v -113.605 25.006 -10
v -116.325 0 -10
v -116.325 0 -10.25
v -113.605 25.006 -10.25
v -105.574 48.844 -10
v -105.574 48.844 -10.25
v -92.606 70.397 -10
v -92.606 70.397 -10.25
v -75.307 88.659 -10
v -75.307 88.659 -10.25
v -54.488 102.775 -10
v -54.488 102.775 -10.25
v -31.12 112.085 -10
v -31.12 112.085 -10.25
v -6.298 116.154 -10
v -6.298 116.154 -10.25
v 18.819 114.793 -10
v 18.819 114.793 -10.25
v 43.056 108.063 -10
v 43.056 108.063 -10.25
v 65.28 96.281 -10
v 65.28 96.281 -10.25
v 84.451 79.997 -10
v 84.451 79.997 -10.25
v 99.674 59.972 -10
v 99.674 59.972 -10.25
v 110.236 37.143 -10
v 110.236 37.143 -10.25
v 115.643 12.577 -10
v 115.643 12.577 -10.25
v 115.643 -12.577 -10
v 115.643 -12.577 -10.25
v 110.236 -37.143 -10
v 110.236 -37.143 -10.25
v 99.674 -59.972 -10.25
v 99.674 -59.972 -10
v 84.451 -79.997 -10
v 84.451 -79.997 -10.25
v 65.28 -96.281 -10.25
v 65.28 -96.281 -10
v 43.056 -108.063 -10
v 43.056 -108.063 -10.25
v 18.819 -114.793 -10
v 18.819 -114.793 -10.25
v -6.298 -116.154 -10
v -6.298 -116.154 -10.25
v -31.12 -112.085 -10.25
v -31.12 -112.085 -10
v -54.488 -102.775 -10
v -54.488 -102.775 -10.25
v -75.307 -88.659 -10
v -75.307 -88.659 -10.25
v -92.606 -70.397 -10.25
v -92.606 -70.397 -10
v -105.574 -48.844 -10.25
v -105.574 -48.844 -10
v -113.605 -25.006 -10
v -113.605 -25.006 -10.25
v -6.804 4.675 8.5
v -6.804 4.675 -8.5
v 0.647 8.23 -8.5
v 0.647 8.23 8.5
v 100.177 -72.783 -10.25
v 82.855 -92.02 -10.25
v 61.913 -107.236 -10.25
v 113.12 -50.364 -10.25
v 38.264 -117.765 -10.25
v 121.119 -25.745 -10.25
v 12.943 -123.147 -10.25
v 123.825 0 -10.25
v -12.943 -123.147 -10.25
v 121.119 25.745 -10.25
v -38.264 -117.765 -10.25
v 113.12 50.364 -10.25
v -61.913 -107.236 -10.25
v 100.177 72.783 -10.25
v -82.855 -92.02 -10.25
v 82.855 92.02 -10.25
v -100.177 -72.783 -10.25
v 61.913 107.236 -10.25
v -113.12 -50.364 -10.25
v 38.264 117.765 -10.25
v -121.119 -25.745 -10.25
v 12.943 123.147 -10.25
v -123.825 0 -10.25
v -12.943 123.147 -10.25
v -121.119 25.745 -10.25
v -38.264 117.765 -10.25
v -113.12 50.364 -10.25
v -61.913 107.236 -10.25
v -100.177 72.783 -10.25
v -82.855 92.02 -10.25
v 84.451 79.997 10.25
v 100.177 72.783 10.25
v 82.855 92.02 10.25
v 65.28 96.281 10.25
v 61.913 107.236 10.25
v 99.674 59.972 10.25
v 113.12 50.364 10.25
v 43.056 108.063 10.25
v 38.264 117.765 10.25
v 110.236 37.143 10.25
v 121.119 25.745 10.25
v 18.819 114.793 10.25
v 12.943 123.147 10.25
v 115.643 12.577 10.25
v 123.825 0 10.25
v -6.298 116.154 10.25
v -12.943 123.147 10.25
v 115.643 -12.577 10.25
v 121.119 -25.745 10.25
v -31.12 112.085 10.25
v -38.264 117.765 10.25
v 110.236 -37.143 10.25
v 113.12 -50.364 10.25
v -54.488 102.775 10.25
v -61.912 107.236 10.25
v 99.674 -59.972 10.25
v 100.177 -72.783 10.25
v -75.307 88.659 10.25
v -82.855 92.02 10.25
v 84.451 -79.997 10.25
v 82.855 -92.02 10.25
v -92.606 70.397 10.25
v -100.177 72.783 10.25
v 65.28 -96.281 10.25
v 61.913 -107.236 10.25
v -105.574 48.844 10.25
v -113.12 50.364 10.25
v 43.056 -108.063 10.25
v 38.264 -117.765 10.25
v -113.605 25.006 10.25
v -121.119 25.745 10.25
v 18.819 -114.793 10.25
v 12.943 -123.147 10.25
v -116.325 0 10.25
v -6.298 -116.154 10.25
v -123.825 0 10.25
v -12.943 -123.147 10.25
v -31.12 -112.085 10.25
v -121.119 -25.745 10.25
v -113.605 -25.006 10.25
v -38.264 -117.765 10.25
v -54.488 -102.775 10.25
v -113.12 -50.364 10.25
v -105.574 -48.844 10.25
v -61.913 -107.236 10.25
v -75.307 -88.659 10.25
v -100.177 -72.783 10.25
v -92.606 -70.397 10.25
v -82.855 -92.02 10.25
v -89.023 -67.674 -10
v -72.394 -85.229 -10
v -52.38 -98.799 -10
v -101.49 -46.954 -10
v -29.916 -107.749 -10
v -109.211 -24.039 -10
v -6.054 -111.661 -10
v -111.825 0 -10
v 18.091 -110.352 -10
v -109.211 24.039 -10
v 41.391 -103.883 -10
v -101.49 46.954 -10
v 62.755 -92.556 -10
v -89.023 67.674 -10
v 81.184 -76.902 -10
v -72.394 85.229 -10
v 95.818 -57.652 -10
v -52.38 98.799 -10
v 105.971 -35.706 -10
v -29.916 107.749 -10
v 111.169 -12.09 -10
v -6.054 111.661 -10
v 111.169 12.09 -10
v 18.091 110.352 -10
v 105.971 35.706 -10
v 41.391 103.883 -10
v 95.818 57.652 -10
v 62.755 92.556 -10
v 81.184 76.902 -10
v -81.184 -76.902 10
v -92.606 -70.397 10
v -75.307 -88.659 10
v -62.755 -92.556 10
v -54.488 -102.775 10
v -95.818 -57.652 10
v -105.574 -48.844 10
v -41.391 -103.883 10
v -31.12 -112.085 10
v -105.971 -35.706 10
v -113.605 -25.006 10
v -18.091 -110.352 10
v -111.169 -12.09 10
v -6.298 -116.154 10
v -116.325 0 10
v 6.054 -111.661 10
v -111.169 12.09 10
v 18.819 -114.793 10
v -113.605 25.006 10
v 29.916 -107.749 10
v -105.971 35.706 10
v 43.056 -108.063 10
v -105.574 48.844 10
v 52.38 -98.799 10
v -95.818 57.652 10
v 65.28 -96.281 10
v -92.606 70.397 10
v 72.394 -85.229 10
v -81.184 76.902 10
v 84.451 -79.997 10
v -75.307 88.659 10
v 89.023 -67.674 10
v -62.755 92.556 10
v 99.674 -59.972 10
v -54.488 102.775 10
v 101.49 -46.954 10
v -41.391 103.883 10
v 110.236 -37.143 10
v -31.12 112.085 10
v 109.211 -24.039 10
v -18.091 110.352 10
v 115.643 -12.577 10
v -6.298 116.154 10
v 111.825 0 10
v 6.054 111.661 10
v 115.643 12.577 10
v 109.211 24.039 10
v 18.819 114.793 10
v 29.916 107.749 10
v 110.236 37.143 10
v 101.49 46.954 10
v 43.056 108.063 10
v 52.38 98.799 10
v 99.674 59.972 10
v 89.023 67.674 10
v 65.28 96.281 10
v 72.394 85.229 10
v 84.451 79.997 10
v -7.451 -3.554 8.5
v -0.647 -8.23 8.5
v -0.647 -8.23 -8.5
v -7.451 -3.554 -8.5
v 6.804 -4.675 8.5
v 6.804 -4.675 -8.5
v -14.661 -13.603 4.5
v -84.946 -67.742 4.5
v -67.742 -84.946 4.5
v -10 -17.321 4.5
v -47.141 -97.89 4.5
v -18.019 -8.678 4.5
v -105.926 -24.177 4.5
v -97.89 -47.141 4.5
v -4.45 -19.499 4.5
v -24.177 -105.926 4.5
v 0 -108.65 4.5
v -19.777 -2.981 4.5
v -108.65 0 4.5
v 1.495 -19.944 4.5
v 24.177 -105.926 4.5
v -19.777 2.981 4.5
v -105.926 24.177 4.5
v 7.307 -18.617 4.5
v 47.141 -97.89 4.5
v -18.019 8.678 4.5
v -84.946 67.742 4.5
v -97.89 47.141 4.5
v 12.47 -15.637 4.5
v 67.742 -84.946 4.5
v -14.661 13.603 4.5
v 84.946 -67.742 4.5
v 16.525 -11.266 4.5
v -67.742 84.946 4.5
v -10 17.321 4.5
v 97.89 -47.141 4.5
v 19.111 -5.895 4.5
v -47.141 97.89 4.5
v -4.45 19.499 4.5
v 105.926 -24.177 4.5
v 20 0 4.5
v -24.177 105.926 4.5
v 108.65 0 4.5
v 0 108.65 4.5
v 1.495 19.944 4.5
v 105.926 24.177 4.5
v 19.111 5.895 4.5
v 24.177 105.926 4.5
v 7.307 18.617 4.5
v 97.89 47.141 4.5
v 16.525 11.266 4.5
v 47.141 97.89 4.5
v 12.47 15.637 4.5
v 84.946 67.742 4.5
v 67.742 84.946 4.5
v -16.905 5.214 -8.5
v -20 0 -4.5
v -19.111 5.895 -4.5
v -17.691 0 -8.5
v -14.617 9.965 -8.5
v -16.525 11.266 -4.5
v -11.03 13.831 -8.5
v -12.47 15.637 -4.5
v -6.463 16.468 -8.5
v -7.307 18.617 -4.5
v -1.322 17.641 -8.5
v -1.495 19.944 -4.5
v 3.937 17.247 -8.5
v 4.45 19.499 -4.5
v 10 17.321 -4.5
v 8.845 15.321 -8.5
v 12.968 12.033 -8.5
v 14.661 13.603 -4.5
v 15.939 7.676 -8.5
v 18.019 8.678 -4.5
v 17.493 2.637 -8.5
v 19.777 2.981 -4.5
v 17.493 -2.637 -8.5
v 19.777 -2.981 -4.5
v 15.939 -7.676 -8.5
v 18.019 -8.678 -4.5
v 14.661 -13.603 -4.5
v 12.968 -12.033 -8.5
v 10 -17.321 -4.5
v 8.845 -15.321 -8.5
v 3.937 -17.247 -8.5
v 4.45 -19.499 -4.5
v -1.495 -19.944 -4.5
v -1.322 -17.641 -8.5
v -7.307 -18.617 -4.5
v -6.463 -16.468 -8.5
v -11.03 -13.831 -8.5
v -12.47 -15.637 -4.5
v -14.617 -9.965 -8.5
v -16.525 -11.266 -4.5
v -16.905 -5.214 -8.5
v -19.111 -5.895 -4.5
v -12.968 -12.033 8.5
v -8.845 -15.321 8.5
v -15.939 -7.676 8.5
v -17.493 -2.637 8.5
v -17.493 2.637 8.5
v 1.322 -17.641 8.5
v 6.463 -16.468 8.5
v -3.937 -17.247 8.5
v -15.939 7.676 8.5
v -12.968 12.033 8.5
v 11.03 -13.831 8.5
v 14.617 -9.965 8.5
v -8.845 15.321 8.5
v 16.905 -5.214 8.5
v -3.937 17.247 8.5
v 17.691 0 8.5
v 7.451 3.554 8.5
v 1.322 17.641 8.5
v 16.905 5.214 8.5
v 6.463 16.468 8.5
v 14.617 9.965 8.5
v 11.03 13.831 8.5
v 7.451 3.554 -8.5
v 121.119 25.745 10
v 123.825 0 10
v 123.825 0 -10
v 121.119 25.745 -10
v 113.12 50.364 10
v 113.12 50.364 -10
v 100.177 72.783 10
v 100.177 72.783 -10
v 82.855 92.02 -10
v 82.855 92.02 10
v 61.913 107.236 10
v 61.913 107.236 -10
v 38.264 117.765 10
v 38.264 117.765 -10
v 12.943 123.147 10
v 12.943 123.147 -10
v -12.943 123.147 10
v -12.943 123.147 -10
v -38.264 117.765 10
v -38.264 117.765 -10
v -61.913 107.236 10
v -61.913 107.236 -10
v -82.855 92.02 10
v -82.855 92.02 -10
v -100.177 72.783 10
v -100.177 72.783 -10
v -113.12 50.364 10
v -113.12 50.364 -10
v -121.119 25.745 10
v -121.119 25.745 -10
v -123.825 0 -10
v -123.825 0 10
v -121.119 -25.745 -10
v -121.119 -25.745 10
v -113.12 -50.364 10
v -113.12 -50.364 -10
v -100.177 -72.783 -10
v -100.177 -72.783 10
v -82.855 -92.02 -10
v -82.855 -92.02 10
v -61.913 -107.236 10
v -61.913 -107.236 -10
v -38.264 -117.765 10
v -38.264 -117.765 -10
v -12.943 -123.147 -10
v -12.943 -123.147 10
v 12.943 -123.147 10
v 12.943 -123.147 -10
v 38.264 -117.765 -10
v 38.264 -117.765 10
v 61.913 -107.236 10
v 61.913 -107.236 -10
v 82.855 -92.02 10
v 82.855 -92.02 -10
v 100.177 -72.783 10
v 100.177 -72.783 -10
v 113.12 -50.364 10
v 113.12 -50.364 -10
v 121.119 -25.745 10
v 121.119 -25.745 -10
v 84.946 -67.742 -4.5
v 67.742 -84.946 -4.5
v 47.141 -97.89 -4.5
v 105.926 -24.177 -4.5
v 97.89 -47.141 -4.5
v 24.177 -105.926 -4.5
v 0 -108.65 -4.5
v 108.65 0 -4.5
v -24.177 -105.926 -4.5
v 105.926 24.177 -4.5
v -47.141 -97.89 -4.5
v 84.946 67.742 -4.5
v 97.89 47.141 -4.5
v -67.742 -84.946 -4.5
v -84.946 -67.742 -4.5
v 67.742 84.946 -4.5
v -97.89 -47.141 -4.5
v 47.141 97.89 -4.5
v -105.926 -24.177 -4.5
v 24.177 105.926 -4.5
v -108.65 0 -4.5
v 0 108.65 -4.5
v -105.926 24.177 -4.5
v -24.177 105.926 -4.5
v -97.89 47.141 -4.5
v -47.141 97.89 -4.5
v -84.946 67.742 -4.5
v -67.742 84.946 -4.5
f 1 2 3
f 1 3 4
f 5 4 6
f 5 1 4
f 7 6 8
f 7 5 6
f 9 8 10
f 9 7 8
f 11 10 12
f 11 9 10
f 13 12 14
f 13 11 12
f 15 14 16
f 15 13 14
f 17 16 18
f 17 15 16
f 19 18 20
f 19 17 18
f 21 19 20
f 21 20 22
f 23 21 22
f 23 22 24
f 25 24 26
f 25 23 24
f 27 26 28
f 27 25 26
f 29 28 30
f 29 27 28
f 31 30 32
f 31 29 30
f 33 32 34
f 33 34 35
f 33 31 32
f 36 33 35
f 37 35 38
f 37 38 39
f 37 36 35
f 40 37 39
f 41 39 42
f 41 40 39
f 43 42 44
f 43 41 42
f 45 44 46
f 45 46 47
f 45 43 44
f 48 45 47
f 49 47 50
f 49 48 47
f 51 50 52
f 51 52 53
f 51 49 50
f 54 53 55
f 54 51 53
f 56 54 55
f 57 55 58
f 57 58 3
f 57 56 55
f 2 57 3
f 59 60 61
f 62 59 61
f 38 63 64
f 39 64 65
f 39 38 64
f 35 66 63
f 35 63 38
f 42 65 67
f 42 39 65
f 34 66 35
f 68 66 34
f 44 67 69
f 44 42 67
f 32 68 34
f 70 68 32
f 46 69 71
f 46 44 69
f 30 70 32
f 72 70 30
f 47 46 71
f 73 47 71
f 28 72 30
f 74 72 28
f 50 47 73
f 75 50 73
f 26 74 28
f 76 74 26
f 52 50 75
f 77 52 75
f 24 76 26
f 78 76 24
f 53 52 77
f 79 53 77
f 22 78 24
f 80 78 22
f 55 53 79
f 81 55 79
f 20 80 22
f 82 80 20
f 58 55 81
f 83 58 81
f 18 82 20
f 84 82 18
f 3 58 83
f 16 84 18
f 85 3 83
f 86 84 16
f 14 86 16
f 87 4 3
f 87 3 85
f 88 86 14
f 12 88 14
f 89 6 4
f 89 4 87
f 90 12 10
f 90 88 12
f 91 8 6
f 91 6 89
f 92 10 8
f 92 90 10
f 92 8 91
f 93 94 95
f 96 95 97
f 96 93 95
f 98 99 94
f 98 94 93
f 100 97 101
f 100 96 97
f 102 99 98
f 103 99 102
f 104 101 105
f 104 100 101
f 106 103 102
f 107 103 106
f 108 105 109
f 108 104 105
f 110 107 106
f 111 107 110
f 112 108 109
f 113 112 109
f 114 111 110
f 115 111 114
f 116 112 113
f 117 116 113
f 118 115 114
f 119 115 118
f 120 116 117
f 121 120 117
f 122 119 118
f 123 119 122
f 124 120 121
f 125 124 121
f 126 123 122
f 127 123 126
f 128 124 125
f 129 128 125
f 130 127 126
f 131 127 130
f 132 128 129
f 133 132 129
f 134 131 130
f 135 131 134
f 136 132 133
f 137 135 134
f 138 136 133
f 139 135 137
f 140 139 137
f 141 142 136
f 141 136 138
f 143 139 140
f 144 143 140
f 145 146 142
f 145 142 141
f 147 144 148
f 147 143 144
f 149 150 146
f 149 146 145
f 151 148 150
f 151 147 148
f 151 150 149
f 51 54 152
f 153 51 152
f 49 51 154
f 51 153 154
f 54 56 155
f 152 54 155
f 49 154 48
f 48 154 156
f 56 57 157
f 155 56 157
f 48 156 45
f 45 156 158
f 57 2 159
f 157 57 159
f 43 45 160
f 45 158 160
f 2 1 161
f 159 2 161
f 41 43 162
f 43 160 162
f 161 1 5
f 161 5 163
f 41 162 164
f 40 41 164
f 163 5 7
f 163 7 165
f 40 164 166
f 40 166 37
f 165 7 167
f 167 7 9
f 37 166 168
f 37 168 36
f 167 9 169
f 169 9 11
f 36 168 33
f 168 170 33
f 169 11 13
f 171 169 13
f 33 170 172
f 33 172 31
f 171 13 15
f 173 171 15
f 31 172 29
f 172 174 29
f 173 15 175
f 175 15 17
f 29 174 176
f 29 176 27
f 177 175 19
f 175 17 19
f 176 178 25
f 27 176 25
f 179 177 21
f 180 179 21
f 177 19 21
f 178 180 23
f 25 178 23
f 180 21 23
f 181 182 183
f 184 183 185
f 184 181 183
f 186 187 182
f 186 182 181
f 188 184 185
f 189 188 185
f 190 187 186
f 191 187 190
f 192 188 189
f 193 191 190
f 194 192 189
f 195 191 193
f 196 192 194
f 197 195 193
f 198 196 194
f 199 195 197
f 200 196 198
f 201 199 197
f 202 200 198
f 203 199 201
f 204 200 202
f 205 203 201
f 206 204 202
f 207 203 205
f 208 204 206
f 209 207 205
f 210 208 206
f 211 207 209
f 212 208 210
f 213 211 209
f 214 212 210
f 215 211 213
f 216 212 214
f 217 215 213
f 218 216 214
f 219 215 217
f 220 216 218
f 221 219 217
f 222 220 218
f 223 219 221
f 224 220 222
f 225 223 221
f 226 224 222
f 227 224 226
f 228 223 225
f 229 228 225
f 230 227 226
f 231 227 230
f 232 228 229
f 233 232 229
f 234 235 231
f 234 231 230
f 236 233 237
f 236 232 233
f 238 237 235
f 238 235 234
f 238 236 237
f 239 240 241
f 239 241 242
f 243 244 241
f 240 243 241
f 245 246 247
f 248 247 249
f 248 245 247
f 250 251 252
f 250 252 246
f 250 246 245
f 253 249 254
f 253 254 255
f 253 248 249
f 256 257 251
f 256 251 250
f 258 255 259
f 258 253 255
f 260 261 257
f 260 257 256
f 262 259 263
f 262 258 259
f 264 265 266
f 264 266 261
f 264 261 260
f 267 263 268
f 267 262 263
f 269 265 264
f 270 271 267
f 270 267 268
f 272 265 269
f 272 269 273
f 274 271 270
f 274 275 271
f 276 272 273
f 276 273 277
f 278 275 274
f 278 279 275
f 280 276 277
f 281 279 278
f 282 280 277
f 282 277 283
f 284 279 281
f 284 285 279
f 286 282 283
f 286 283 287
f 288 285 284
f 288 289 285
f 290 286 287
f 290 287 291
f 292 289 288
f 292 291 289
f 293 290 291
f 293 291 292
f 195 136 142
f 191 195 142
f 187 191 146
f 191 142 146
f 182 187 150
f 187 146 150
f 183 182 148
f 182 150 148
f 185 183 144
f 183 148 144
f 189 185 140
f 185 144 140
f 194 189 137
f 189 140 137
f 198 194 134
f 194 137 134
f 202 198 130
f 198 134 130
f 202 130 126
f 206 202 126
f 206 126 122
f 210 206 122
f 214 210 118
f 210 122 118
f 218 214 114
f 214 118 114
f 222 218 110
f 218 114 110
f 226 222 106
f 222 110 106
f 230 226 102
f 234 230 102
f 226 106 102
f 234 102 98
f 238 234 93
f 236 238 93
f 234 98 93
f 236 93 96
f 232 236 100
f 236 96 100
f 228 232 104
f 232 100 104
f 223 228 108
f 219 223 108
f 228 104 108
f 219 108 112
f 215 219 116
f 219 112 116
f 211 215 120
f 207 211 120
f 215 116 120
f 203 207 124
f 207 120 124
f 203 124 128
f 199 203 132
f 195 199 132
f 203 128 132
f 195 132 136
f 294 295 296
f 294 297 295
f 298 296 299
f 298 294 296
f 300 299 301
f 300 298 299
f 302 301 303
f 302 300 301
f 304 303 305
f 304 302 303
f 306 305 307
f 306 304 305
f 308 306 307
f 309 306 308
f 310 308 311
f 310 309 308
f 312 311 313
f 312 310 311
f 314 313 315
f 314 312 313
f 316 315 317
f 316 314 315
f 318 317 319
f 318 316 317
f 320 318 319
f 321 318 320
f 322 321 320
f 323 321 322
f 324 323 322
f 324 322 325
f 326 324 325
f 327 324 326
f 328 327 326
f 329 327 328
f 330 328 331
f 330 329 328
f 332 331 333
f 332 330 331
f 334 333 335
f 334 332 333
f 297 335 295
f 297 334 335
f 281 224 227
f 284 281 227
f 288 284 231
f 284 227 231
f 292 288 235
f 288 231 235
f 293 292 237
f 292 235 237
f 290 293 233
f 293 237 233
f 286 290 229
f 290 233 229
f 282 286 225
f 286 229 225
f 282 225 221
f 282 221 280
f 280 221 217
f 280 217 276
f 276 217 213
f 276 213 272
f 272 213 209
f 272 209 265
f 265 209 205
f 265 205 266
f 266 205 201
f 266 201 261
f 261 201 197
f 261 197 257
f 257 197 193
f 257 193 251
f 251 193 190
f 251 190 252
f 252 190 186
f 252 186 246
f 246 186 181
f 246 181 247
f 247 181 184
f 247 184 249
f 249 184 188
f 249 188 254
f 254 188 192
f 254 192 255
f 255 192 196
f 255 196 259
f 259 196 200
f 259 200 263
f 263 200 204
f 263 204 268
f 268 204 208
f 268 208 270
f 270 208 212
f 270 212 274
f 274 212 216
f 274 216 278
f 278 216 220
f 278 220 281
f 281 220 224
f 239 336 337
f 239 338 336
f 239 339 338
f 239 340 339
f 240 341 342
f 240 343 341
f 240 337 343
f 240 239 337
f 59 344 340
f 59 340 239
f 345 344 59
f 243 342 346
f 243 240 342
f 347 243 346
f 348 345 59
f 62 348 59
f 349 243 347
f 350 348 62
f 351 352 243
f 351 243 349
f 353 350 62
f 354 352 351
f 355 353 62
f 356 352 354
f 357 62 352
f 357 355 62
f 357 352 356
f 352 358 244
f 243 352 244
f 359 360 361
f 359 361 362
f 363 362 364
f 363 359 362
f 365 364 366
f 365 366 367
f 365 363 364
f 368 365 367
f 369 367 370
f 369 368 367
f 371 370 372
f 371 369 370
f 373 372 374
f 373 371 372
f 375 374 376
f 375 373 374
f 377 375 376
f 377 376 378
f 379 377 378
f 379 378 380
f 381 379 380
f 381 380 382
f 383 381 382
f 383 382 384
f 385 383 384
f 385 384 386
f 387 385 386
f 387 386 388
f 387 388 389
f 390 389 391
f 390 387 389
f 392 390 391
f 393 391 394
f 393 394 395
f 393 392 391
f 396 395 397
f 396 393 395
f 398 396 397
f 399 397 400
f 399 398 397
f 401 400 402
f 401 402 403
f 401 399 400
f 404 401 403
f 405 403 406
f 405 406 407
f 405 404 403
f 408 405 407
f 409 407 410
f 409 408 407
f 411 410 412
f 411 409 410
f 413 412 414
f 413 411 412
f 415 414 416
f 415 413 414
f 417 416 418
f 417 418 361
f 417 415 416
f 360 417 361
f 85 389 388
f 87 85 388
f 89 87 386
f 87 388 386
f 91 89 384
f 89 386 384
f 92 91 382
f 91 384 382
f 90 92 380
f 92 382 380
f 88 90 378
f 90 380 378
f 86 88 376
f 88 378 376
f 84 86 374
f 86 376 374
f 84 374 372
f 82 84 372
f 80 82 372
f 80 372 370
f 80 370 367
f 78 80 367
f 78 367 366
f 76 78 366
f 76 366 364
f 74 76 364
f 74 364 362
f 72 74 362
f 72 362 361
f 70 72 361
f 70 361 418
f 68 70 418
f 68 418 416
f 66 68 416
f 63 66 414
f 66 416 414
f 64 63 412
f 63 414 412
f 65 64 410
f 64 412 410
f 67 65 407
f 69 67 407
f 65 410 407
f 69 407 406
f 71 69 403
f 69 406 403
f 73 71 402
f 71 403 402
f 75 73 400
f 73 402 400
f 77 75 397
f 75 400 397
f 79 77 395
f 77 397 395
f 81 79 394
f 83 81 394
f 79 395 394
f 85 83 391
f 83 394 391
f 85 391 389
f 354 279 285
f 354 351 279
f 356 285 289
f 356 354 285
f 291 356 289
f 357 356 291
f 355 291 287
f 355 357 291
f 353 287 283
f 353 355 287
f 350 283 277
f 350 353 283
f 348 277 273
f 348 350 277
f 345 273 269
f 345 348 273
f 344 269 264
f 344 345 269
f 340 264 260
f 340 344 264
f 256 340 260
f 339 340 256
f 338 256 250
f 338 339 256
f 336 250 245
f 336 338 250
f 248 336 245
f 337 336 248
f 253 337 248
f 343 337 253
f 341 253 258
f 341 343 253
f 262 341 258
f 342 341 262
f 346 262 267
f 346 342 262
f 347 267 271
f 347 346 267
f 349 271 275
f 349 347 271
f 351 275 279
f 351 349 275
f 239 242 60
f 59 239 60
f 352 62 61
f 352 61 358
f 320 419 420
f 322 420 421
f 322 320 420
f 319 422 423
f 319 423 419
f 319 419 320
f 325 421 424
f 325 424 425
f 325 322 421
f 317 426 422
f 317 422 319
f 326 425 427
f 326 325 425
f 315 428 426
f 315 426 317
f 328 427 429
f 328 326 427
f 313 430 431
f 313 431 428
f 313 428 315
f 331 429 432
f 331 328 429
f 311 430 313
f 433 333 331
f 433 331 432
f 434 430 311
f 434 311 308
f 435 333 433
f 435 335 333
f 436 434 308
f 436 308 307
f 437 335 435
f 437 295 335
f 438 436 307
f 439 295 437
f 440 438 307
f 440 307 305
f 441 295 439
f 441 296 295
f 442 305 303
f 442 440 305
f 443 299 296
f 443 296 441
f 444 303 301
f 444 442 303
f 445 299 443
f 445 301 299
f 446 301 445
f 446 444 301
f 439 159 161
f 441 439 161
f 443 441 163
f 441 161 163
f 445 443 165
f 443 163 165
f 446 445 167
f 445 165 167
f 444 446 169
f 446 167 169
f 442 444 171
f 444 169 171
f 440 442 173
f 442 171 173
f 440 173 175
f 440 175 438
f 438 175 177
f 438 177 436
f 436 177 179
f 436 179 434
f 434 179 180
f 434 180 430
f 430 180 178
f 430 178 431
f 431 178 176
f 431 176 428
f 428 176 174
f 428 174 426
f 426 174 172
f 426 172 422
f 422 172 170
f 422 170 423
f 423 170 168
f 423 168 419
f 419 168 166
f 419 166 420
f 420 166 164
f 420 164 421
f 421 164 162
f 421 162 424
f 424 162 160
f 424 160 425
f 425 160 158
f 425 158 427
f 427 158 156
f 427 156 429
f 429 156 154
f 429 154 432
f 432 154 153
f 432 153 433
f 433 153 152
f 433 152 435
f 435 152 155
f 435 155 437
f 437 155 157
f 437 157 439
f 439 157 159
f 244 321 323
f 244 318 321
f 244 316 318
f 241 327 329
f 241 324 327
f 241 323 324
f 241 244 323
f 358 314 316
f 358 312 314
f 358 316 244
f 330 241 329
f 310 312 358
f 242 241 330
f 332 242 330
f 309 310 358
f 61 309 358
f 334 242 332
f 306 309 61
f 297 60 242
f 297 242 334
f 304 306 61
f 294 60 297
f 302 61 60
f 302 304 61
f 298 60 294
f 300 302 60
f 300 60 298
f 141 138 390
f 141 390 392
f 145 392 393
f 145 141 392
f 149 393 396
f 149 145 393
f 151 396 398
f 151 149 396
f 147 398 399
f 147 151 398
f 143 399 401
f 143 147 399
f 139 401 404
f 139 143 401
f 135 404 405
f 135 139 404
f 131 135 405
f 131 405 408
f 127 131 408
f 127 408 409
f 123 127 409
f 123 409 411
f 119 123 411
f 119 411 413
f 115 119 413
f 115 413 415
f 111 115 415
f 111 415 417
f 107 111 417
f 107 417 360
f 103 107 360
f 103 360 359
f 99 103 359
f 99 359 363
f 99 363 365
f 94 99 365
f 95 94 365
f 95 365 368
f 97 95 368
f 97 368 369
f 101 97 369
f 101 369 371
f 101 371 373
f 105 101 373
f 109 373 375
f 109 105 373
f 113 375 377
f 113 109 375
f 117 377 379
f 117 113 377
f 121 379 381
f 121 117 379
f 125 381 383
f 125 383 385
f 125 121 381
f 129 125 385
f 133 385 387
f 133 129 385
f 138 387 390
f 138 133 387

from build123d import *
from build123d.topology import SkipClean

# Parameters (mm, degrees)
SKETCH1_R           = 123.825
BOSS_EXTRUDE1_DEPTH = 10
SKETCH4_R           = 111.825
CUT_EXTRUDE1_DEPTH  = 5.5
CUT_EXTRUDE1_DRAFT  = -30
SKETCH5_R           = 111.825
CUT_EXTRUDE2_DEPTH  = 5.5
CUT_EXTRUDE2_DRAFT  = -30
SKETCH6_R           = 20
BOSS_EXTRUDE2_DEPTH = 4
BOSS_EXTRUDE2_TAPER = 30
SKETCH9_R           = 20
BOSS_EXTRUDE3_DEPTH = 4
BOSS_EXTRUDE3_TAPER = 30
CUT_EXTRUDE4_DEPTH  = 24
SKETCH11_R          = 123.825
SKETCH11_R_2        = 116.325
BOSS_EXTRUDE4_DEPTH = 0.25
BOSS_EXTRUDE5_START = 0.25
SKETCH13_R          = 123.825
SKETCH13_R_2        = 116.325
BOSS_EXTRUDE5_DEPTH = 0.25


with BuildPart() as part:
    # Sketch1 → Boss-Extrude1 (new, symmetric)
    with BuildSketch(Plane.XY):
        Circle(SKETCH1_R)
    extrude(amount=BOSS_EXTRUDE1_DEPTH, both=True)


with BuildPart() as cut_extrude1_tool:
    # Sketch4 → Cut-Extrude1 (with draft: the straight prism first)
    with BuildSketch(Plane.XY.offset(10)):
        Circle(SKETCH4_R)
    extrude(amount=-CUT_EXTRUDE1_DEPTH)
    # Cut-Extrude1: the draft: its side faces are tilted about the plane it starts from
    cut_extrude1_sides = [cut_extrude1_tool.faces().sort_by_distance(p)[0] for p in [
        (-111.825, 0, 7.25),
    ]]
    draft(cut_extrude1_sides, Plane.XY.offset(10), CUT_EXTRUDE1_DRAFT)


with BuildPart() as part_1:
    add(part.part)

    # Cut-Extrude1: cut by cut_extrude1_tool
    add(cut_extrude1_tool.part, mode=Mode.SUBTRACT)


with BuildPart() as cut_extrude2_tool:
    # Sketch5 → Cut-Extrude2 (with draft: the straight prism first)
    with BuildSketch(Plane(origin=(0, 0, -10), x_dir=(-1, 0, 0), z_dir=(0, 0, -1))):
        Circle(SKETCH5_R)
    extrude(amount=-CUT_EXTRUDE2_DEPTH)
    # Cut-Extrude2: the draft: its side faces are tilted about the plane it starts from
    cut_extrude2_sides = [cut_extrude2_tool.faces().sort_by_distance(p)[0] for p in [
        (111.825, 0, -7.25),
    ]]
    draft(cut_extrude2_sides, Plane(origin=(0, 0, -10), x_dir=(-1, 0, 0), z_dir=(0, 0, -1)), CUT_EXTRUDE2_DRAFT)


with BuildPart() as part_2:
    add(part_1.part)

    # Cut-Extrude2: cut by cut_extrude2_tool
    add(cut_extrude2_tool.part, mode=Mode.SUBTRACT)

    # Sketch6 → Boss-Extrude2 (add)
    with BuildSketch(Plane.XY.offset(4.5)):
        Circle(SKETCH6_R)
    extrude(amount=BOSS_EXTRUDE2_DEPTH, taper=BOSS_EXTRUDE2_TAPER)

    # Sketch9 → Boss-Extrude3 (add)
    with BuildSketch(Plane(origin=(0, 0, -4.5), x_dir=(-1, 0, 0), z_dir=(0, 0, -1))):
        Circle(SKETCH9_R)
    extrude(amount=BOSS_EXTRUDE3_DEPTH, taper=BOSS_EXTRUDE3_TAPER)

    # Sketch10 → Cut-Extrude4 (cut)
    with BuildSketch(Plane(origin=(0, 0, -8.5), x_dir=(-1, 0, 0), z_dir=(0, 0, -1))):
        Polygon((7.450577941, -3.554421662), (6.803508425, 4.675178938), (-0.647069515, 8.2296006), (-7.450577941, 3.554421662), (-6.803508425, -4.675178938), (0.647069515, -8.2296006), align=None)
    extrude(amount=-CUT_EXTRUDE4_DEPTH, mode=Mode.SUBTRACT)

    # Sketch11 → Boss-Extrude4 (add)
    with BuildSketch(Plane(origin=(0, 0, -10), x_dir=(-1, 0, 0), z_dir=(0, 0, -1))):
        Circle(SKETCH11_R)
        Circle(SKETCH11_R_2, mode=Mode.SUBTRACT)
    extrude(amount=BOSS_EXTRUDE4_DEPTH)

    # Sketch13 → Boss-Extrude5 (add)
    with SkipClean():  # the faces are left unmerged after this step: merging them gives an invalid solid
        with BuildSketch(Plane.XY.offset(10).offset(BOSS_EXTRUDE5_START)):
            with Locations(Location((0, 0, 0), (0, 0, 180))):
                Circle(SKETCH13_R)
            with Locations(Location((0, 0, 0), (0, 0, 180))):
                Circle(SKETCH13_R_2, mode=Mode.SUBTRACT)
        extrude(amount=-BOSS_EXTRUDE5_DEPTH)


solid = part_2.part
